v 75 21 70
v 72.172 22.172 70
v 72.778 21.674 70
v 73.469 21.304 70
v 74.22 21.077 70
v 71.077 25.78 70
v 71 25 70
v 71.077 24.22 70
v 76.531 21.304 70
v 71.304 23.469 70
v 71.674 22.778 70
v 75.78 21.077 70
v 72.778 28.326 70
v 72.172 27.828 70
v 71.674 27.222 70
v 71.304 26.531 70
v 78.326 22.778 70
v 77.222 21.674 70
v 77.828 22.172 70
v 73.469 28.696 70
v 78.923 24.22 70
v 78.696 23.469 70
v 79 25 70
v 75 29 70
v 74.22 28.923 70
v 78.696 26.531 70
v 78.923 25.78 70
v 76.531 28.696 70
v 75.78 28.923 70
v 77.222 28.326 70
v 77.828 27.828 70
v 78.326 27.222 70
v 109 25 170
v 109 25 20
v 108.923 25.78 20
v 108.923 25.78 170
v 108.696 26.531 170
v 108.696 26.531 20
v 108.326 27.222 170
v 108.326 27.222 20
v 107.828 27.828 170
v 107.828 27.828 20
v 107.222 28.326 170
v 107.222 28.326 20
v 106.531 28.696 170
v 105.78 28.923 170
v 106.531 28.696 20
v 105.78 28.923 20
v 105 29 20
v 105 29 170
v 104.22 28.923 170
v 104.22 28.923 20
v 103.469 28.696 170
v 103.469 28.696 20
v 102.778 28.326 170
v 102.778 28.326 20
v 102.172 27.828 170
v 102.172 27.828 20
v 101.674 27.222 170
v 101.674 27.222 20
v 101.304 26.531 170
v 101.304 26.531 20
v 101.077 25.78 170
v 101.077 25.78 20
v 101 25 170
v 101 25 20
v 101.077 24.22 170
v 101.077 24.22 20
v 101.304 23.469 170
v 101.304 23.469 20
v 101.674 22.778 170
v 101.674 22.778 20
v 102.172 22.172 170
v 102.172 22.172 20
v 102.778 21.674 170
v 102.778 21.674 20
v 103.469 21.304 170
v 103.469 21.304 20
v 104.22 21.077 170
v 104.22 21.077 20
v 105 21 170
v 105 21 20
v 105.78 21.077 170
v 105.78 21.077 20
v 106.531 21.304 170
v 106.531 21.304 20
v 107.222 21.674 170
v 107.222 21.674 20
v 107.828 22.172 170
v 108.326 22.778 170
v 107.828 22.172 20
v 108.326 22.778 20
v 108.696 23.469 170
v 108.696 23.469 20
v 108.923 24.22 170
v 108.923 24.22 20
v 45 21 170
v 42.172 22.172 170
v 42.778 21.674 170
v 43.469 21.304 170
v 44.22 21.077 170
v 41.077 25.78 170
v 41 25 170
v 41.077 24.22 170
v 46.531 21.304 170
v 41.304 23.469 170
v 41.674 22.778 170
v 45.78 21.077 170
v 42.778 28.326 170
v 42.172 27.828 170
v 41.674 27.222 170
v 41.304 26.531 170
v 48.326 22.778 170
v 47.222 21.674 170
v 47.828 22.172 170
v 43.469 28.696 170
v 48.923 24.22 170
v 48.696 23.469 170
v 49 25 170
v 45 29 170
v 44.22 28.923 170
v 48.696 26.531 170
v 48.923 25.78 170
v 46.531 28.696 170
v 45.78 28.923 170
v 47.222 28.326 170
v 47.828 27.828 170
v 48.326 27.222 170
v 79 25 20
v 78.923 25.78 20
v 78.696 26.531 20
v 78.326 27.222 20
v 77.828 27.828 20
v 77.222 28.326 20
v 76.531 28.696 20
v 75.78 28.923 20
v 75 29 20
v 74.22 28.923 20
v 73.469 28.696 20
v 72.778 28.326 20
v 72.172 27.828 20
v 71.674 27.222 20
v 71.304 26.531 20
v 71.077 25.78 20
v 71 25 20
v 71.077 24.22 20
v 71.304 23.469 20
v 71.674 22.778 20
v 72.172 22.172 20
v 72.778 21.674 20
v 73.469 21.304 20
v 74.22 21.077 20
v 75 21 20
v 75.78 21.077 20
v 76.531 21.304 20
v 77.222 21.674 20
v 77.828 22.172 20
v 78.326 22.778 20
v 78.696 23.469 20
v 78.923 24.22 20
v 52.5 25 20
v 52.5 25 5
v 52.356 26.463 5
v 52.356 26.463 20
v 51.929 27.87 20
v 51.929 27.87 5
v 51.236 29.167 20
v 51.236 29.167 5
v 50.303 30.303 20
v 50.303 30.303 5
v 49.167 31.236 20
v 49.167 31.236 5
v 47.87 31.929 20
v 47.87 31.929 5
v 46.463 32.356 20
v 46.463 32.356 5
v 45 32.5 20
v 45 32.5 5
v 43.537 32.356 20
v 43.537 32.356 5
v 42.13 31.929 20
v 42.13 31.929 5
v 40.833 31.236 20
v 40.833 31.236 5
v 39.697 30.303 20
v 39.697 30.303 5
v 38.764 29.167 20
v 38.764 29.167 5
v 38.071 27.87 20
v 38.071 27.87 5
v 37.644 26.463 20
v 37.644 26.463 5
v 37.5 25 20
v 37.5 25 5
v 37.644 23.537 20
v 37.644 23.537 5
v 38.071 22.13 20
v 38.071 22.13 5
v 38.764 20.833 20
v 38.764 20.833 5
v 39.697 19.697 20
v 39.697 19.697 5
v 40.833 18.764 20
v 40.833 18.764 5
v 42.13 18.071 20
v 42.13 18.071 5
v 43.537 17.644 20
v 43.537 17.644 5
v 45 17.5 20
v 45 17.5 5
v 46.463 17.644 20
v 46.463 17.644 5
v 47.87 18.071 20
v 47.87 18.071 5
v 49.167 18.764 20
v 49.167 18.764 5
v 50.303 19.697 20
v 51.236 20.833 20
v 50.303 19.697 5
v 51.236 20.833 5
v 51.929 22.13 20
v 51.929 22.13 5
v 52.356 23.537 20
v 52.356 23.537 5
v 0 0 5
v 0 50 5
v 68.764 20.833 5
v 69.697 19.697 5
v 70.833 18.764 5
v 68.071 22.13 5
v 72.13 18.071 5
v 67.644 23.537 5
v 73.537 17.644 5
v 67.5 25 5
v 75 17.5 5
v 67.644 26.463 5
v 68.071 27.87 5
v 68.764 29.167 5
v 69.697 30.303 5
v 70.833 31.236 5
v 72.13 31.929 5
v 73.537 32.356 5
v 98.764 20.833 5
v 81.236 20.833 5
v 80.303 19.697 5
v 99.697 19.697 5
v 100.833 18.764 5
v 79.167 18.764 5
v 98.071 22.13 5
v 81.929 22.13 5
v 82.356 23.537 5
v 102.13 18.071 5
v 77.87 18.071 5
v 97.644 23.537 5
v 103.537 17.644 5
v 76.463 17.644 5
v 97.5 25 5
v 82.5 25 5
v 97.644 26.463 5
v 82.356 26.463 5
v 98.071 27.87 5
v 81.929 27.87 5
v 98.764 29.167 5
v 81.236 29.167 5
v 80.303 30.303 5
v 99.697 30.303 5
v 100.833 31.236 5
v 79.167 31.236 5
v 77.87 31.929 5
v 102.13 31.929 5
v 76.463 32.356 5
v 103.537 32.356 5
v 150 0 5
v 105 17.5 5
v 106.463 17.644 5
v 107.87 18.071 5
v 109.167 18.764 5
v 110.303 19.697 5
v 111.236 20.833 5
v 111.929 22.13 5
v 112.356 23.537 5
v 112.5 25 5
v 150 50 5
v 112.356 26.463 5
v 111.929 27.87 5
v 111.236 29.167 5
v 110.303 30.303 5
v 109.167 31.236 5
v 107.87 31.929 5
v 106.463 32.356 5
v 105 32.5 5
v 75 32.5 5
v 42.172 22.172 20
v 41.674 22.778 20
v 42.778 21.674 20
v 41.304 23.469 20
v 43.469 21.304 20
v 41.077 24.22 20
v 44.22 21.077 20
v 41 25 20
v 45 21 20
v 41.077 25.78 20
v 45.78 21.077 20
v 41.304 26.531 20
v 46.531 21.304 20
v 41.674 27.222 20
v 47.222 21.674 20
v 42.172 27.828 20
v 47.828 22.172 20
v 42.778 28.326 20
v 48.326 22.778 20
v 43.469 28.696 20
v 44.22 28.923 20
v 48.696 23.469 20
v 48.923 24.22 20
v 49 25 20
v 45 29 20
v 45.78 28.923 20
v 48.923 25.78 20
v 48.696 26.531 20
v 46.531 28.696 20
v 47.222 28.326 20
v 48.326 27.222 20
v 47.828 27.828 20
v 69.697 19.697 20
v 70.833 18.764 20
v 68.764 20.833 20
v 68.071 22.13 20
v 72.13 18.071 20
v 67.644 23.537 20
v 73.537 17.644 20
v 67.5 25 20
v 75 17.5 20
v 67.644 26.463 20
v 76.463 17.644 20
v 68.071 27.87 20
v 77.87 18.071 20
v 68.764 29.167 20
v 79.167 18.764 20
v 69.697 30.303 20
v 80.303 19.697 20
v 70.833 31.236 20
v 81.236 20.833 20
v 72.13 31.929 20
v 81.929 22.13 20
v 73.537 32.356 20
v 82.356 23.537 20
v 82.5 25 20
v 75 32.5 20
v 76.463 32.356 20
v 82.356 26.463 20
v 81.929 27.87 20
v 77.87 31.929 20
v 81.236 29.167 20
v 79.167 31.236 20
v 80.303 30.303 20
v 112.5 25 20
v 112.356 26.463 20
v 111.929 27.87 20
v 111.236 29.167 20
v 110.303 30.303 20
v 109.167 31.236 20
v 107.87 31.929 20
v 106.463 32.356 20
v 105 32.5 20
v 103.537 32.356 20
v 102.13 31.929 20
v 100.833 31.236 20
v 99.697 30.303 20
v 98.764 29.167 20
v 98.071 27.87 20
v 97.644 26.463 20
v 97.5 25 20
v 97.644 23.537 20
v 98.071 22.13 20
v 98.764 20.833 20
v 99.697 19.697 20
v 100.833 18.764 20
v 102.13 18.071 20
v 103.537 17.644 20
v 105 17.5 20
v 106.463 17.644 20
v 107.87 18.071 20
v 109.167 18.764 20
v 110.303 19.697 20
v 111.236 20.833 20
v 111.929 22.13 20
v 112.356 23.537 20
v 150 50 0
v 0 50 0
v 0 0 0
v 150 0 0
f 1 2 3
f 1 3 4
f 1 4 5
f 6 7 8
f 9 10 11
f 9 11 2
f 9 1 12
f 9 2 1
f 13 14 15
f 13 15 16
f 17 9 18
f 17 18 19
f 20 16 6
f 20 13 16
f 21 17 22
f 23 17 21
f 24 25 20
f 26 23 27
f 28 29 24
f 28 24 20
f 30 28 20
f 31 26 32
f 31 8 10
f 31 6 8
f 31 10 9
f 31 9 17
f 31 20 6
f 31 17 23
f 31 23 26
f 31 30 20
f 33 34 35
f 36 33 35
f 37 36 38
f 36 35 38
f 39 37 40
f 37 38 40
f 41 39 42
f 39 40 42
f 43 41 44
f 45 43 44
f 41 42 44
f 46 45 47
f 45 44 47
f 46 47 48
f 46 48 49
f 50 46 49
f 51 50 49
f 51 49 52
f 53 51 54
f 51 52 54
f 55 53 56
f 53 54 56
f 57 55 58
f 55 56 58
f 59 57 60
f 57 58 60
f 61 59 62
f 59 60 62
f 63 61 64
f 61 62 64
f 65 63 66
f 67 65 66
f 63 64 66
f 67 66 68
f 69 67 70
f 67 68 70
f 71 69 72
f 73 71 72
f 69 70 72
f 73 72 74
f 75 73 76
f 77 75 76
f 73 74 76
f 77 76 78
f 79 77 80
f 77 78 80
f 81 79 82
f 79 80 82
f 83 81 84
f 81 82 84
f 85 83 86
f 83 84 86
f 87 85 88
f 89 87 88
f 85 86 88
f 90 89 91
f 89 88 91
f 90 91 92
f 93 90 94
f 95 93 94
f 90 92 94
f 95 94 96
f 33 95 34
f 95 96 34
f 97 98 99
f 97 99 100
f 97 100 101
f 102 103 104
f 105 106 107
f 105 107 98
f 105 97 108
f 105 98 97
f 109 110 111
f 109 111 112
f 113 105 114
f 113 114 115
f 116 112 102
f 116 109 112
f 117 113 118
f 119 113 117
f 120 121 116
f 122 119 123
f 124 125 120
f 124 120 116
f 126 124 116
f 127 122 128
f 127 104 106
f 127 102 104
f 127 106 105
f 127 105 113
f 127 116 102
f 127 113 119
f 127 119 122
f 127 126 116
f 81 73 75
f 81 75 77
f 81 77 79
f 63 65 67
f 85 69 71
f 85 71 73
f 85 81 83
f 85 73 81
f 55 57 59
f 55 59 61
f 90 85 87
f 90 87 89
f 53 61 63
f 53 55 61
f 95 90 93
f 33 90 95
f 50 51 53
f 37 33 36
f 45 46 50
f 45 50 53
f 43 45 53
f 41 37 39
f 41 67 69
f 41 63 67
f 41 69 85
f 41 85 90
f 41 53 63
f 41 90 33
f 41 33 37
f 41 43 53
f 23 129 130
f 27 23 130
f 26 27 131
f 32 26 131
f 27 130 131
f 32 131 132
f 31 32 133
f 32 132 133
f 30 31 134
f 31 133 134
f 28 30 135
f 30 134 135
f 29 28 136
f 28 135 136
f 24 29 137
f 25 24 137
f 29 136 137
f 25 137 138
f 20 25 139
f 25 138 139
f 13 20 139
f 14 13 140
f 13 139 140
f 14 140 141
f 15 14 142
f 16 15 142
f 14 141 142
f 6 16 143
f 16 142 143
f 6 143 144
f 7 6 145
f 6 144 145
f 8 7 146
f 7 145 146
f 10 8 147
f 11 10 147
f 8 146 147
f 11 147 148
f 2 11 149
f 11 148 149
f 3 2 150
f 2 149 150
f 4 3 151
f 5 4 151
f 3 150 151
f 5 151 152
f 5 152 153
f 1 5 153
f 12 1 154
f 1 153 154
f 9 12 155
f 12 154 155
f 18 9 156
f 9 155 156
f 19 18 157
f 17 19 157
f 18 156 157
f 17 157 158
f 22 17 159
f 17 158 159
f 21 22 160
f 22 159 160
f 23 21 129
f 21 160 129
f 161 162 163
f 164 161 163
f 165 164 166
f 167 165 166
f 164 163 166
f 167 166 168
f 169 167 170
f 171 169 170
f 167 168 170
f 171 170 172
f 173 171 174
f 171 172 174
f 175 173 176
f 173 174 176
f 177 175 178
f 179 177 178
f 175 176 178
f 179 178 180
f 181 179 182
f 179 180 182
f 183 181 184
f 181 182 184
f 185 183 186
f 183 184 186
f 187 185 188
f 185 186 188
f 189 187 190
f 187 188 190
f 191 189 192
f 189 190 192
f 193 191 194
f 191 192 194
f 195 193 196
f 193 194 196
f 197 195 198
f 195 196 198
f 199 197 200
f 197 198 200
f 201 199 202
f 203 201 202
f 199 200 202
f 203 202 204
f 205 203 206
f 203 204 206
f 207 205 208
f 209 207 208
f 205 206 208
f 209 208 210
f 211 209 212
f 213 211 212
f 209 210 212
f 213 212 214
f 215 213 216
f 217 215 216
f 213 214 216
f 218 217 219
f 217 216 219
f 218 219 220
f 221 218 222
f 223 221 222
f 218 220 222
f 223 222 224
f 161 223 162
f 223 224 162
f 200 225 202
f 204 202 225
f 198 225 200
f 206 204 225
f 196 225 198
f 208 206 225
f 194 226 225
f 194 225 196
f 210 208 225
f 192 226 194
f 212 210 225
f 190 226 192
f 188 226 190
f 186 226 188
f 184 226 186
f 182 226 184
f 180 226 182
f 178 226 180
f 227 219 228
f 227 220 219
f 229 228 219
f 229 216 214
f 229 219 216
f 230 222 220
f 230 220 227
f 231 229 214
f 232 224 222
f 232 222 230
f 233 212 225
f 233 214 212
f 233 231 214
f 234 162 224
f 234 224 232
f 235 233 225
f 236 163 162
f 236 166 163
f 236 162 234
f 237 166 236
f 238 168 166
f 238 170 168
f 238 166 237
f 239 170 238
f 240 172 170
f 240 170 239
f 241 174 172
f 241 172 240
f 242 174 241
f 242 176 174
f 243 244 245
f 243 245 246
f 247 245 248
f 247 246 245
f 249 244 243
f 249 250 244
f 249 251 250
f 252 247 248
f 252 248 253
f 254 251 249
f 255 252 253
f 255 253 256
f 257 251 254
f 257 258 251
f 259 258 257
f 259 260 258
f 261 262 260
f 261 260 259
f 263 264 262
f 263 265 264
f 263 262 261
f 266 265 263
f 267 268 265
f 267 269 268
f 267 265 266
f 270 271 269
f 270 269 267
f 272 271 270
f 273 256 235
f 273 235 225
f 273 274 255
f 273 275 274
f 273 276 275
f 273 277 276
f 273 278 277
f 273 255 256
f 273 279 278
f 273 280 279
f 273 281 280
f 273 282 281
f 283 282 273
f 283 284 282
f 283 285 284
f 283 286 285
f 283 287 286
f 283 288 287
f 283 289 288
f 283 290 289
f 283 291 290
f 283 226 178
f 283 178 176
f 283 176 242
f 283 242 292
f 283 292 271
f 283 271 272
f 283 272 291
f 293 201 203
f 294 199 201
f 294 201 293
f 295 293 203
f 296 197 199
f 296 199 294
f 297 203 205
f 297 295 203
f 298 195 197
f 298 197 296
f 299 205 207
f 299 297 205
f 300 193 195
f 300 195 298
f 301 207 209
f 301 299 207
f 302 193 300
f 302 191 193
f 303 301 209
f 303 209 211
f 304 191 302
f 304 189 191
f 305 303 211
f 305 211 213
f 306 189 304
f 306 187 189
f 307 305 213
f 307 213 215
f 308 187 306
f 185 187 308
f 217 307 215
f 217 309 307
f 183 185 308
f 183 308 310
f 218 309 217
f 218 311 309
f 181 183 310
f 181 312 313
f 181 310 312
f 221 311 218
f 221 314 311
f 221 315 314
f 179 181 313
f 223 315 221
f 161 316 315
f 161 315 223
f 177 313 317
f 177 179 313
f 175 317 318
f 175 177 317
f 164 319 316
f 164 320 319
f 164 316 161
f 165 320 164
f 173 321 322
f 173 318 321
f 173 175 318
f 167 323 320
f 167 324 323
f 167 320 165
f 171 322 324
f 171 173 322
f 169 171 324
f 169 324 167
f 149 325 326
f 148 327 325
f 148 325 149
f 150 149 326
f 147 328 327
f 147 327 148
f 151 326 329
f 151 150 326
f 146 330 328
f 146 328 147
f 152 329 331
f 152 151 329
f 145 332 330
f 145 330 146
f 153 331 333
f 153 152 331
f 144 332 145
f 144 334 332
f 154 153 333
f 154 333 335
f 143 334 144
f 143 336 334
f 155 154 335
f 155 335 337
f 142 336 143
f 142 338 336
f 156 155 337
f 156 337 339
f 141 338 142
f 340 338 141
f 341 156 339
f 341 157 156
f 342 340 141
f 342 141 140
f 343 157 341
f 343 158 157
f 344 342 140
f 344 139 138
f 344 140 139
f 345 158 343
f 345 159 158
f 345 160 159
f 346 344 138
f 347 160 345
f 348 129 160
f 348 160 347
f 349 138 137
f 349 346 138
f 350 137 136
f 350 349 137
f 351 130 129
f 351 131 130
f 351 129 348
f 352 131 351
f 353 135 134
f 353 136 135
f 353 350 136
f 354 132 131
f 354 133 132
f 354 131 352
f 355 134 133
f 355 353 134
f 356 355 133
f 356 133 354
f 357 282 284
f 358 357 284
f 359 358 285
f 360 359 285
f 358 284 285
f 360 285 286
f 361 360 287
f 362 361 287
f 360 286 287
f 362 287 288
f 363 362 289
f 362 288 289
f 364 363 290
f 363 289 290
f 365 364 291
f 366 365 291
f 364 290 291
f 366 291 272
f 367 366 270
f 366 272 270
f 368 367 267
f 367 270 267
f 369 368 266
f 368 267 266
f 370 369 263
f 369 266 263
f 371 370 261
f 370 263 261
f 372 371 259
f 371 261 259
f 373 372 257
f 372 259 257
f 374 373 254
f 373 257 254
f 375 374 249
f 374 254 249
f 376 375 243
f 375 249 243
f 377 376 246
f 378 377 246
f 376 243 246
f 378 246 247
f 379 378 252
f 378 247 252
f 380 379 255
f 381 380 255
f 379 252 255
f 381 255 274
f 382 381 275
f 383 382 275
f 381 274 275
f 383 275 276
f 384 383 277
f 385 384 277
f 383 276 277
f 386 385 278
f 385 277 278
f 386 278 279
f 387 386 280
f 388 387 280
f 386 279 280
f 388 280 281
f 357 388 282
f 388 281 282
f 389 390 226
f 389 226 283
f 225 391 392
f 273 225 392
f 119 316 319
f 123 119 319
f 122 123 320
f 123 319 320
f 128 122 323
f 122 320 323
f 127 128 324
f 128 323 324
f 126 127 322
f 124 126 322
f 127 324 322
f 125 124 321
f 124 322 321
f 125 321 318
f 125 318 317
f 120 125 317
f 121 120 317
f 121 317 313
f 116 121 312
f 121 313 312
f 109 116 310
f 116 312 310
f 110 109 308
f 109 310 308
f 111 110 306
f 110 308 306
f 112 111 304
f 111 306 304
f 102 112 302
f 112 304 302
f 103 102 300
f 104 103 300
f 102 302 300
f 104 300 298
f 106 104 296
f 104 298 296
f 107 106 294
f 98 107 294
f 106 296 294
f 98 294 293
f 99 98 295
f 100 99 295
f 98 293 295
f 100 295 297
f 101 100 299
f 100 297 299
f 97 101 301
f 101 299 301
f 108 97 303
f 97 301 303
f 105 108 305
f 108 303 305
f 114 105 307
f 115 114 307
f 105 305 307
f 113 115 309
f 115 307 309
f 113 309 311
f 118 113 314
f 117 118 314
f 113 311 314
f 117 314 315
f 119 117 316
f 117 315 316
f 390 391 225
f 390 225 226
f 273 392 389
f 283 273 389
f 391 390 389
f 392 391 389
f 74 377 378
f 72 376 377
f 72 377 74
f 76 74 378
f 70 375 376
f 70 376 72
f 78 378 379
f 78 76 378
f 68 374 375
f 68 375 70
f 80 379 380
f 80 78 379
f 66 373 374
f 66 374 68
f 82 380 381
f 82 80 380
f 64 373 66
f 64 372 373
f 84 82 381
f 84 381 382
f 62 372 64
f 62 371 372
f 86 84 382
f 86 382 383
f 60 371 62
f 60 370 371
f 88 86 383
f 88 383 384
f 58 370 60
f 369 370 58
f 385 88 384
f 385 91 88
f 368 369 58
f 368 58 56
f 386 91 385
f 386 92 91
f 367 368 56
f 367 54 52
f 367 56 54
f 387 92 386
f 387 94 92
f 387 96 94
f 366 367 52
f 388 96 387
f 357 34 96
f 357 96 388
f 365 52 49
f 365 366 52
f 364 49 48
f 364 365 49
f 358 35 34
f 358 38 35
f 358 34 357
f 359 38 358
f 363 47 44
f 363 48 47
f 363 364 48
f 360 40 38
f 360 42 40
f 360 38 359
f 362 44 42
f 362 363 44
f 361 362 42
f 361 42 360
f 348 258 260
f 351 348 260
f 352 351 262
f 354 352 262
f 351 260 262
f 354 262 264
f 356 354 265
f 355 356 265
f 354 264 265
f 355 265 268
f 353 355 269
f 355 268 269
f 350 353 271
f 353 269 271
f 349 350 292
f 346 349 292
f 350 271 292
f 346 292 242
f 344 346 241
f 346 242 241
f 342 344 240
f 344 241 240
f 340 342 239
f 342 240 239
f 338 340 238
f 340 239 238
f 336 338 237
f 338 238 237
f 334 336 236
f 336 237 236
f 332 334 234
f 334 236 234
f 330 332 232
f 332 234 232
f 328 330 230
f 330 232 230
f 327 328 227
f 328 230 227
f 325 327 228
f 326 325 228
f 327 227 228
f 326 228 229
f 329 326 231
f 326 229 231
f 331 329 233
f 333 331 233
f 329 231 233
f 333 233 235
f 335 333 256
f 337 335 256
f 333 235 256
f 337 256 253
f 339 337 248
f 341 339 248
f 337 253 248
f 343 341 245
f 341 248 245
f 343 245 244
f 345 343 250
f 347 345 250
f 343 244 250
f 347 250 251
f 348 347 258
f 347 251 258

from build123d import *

# Parameters (mm, degrees)
F0_W     = 150
F0_H     = 50
F1_DEPTH = 5
F2_R     = 7.5
F3_DEPTH = 15
F4_R     = 4
F5_DEPTH = 150
F6_R     = 4
F7_DEPTH = 50


with BuildPart() as f1:
    # F0 (on Top) → F1 (new body)
    with BuildSketch(Plane.XY):
        with Locations((75, 25)):
            Rectangle(F0_W, F0_H)
    extrude(amount=F1_DEPTH)

    # F2 (on face) → F3 (join)
    with BuildSketch(Plane.XY.offset(5)):
        with Locations((45, 25)):
            Circle(F2_R)
        with Locations((75, 25)):
            Circle(F2_R)
        with Locations((105, 25)):
            Circle(F2_R)
    extrude(amount=F3_DEPTH)

    # F4 (on face) → F5 (join)
    with BuildSketch(Plane.XY.offset(20)):
        with Locations((45, 25)):
            Circle(F4_R)
        with Locations((105, 25)):
            Circle(F4_R)
    extrude(amount=F5_DEPTH)

    # F6 (on face) → F7 (join)
    with BuildSketch(Plane.XY.offset(20)):
        with Locations((75, 25)):
            Circle(F6_R)
    extrude(amount=F7_DEPTH)


solid = f1.part
